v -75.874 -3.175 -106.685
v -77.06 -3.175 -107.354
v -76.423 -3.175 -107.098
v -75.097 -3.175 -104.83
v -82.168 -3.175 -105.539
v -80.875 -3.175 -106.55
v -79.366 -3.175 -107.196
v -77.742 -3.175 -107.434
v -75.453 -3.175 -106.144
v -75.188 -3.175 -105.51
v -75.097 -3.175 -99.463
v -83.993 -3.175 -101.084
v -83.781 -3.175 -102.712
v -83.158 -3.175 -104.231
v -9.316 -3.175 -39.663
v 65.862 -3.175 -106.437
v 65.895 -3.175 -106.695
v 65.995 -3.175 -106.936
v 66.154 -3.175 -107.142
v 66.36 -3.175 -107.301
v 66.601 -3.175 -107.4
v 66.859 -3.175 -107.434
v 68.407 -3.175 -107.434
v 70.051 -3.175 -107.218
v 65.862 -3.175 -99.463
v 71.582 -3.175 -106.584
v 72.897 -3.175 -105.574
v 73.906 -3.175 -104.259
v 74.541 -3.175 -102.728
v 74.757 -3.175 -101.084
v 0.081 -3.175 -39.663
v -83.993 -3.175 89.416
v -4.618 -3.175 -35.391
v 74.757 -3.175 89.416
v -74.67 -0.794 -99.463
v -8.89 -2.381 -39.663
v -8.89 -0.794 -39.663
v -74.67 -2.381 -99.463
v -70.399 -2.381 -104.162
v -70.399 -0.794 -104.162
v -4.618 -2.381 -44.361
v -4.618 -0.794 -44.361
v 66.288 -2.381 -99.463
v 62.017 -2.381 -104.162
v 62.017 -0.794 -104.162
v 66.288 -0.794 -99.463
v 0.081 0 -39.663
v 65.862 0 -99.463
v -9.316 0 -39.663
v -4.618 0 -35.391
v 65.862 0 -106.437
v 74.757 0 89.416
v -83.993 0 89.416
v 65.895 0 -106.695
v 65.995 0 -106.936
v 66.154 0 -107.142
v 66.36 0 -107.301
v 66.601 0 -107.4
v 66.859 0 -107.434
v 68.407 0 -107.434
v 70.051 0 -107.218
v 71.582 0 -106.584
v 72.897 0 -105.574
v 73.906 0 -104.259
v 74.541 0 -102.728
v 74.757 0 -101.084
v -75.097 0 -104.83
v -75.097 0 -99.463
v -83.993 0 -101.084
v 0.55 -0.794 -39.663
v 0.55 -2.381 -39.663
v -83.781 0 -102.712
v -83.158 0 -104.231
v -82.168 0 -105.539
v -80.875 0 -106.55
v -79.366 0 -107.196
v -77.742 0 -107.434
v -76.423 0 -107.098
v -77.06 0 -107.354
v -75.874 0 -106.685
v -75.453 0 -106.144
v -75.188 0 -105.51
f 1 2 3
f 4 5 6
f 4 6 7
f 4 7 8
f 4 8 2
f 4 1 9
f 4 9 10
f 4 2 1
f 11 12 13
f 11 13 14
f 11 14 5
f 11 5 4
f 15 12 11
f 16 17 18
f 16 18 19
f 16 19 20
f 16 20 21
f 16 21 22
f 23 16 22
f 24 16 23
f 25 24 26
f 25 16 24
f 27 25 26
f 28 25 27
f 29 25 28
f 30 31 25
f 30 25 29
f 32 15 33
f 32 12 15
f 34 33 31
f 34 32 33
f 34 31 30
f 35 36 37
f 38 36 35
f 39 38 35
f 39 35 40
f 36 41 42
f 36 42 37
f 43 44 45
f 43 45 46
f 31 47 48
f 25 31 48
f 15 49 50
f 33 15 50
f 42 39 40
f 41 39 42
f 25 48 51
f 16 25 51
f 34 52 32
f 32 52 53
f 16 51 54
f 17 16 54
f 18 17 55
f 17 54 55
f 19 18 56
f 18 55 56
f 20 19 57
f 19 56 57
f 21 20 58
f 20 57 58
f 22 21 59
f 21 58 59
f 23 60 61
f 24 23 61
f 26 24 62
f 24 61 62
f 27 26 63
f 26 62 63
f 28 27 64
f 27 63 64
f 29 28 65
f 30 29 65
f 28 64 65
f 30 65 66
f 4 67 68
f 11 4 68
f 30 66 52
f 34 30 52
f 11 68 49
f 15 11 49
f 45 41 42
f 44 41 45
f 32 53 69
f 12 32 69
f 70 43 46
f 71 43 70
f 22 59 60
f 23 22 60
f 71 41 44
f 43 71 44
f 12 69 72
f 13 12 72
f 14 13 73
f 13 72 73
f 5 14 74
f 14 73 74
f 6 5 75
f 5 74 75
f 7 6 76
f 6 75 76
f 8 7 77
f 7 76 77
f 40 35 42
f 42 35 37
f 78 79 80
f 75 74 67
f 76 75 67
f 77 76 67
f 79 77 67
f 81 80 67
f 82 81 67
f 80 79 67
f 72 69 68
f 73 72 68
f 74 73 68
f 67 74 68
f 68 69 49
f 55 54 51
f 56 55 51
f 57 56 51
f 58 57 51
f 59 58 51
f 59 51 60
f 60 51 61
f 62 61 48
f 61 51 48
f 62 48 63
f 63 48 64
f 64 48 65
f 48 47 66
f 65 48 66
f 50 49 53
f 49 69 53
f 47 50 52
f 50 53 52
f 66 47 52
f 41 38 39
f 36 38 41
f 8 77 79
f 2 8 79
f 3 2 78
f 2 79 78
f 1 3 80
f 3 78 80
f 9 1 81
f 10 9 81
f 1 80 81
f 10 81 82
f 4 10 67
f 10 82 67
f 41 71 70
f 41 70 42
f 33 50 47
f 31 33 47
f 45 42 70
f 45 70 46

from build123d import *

# Parameters (mm, degrees)
F1_DEPTH = 3.175
F3_DEPTH = 1.5875


with BuildPart() as f1:
    # F0 (on Front) → F1 (new body)
    with BuildSketch(Plane.XZ):
        with BuildLine():
            Line((74.7572204843, 89.4156580232), (-83.9927795157, 89.4156580232))
            Line((-83.9927795157, 89.4156580232), (-83.9927795157, -101.0843419768))
            ThreePointArc((-83.9927795157, -101.0843419768), (-82.1678205533, -105.5392834588), (-77.7419122375, -107.4335681267))
            ThreePointArc((-77.7419122375, -107.4335681267), (-75.8742501091, -106.6854552728), (-75.0970715066, -104.8296998773))
            Line((-75.0970715066, -104.8296998773), (-75.0970715066, -99.4634811212))
            Line((-75.0970715066, -99.4634811212), (-9.3163989817, -39.6628697349))
            Line((-9.3163989817, -39.6628697349), (-4.6177795157, -35.391397493))
            Line((-4.6177795157, -35.391397493), (0.0808399504, -39.6628697349))
            Line((0.0808399504, -39.6628697349), (65.8615124753, -99.4634811212))
            Line((65.8615124753, -99.4634811212), (65.8615124753, -106.4368922915))
            ThreePointArc((65.8615124753, -106.4368922915), (66.1536587242, -107.1421957278), (66.8589621606, -107.4343419768))
            Line((66.8589621606, -107.4343419768), (68.4072204843, -107.4343419768))
            ThreePointArc((68.4072204843, -107.4343419768), (72.8973485449, -105.5744700373), (74.7572204843, -101.0843419768))
            Line((74.7572204843, -101.0843419768), (74.7572204843, 89.4156580232))
        make_face()
    extrude(amount=F1_DEPTH)


with BuildPart() as f3:
    # F2 (on face) → F3 (new body)
    with BuildSketch(Plane.XZ.offset(3.175)):
        Polygon((0.1235546728, -39.6628697349), (-5.0449267399, -44.3614892009), (61.5900402334, -104.1621005872), (65.8615124753, -99.4634811212), align=None)
    extrude(amount=-F3_DEPTH)


with BuildPart() as f3b:
    # F2 (on face) → F3, piece 2 (new body)
    with BuildSketch(Plane.XZ.offset(3.175)):
        Polygon((-5.0449267399, -44.3614892009), (-9.3163989817, -39.6628697349), (-75.0970715066, -99.4634811212), (-70.8255992648, -104.1621005872), align=None)
    extrude(amount=-F3_DEPTH)


with BuildPart() as f3b_1:
    # F4: moved
    add(f3b.part.moved(Location((0, 0.79375, 0))))


with BuildPart() as f3_1:
    # F4: moved
    add(f3.part.moved(Location((0, 0.79375, 0))))


with BuildPart() as f3b_2:
    # F5: moved
    add(f3b_1.part.moved(Location((0.42672, 0, 0))))


with BuildPart() as f3_2:
    # F5: moved
    add(f3_1.part.moved(Location((0.42672, 0, 0))))


solid = Compound([f1.part, f3b_2.part, f3_2.part])
